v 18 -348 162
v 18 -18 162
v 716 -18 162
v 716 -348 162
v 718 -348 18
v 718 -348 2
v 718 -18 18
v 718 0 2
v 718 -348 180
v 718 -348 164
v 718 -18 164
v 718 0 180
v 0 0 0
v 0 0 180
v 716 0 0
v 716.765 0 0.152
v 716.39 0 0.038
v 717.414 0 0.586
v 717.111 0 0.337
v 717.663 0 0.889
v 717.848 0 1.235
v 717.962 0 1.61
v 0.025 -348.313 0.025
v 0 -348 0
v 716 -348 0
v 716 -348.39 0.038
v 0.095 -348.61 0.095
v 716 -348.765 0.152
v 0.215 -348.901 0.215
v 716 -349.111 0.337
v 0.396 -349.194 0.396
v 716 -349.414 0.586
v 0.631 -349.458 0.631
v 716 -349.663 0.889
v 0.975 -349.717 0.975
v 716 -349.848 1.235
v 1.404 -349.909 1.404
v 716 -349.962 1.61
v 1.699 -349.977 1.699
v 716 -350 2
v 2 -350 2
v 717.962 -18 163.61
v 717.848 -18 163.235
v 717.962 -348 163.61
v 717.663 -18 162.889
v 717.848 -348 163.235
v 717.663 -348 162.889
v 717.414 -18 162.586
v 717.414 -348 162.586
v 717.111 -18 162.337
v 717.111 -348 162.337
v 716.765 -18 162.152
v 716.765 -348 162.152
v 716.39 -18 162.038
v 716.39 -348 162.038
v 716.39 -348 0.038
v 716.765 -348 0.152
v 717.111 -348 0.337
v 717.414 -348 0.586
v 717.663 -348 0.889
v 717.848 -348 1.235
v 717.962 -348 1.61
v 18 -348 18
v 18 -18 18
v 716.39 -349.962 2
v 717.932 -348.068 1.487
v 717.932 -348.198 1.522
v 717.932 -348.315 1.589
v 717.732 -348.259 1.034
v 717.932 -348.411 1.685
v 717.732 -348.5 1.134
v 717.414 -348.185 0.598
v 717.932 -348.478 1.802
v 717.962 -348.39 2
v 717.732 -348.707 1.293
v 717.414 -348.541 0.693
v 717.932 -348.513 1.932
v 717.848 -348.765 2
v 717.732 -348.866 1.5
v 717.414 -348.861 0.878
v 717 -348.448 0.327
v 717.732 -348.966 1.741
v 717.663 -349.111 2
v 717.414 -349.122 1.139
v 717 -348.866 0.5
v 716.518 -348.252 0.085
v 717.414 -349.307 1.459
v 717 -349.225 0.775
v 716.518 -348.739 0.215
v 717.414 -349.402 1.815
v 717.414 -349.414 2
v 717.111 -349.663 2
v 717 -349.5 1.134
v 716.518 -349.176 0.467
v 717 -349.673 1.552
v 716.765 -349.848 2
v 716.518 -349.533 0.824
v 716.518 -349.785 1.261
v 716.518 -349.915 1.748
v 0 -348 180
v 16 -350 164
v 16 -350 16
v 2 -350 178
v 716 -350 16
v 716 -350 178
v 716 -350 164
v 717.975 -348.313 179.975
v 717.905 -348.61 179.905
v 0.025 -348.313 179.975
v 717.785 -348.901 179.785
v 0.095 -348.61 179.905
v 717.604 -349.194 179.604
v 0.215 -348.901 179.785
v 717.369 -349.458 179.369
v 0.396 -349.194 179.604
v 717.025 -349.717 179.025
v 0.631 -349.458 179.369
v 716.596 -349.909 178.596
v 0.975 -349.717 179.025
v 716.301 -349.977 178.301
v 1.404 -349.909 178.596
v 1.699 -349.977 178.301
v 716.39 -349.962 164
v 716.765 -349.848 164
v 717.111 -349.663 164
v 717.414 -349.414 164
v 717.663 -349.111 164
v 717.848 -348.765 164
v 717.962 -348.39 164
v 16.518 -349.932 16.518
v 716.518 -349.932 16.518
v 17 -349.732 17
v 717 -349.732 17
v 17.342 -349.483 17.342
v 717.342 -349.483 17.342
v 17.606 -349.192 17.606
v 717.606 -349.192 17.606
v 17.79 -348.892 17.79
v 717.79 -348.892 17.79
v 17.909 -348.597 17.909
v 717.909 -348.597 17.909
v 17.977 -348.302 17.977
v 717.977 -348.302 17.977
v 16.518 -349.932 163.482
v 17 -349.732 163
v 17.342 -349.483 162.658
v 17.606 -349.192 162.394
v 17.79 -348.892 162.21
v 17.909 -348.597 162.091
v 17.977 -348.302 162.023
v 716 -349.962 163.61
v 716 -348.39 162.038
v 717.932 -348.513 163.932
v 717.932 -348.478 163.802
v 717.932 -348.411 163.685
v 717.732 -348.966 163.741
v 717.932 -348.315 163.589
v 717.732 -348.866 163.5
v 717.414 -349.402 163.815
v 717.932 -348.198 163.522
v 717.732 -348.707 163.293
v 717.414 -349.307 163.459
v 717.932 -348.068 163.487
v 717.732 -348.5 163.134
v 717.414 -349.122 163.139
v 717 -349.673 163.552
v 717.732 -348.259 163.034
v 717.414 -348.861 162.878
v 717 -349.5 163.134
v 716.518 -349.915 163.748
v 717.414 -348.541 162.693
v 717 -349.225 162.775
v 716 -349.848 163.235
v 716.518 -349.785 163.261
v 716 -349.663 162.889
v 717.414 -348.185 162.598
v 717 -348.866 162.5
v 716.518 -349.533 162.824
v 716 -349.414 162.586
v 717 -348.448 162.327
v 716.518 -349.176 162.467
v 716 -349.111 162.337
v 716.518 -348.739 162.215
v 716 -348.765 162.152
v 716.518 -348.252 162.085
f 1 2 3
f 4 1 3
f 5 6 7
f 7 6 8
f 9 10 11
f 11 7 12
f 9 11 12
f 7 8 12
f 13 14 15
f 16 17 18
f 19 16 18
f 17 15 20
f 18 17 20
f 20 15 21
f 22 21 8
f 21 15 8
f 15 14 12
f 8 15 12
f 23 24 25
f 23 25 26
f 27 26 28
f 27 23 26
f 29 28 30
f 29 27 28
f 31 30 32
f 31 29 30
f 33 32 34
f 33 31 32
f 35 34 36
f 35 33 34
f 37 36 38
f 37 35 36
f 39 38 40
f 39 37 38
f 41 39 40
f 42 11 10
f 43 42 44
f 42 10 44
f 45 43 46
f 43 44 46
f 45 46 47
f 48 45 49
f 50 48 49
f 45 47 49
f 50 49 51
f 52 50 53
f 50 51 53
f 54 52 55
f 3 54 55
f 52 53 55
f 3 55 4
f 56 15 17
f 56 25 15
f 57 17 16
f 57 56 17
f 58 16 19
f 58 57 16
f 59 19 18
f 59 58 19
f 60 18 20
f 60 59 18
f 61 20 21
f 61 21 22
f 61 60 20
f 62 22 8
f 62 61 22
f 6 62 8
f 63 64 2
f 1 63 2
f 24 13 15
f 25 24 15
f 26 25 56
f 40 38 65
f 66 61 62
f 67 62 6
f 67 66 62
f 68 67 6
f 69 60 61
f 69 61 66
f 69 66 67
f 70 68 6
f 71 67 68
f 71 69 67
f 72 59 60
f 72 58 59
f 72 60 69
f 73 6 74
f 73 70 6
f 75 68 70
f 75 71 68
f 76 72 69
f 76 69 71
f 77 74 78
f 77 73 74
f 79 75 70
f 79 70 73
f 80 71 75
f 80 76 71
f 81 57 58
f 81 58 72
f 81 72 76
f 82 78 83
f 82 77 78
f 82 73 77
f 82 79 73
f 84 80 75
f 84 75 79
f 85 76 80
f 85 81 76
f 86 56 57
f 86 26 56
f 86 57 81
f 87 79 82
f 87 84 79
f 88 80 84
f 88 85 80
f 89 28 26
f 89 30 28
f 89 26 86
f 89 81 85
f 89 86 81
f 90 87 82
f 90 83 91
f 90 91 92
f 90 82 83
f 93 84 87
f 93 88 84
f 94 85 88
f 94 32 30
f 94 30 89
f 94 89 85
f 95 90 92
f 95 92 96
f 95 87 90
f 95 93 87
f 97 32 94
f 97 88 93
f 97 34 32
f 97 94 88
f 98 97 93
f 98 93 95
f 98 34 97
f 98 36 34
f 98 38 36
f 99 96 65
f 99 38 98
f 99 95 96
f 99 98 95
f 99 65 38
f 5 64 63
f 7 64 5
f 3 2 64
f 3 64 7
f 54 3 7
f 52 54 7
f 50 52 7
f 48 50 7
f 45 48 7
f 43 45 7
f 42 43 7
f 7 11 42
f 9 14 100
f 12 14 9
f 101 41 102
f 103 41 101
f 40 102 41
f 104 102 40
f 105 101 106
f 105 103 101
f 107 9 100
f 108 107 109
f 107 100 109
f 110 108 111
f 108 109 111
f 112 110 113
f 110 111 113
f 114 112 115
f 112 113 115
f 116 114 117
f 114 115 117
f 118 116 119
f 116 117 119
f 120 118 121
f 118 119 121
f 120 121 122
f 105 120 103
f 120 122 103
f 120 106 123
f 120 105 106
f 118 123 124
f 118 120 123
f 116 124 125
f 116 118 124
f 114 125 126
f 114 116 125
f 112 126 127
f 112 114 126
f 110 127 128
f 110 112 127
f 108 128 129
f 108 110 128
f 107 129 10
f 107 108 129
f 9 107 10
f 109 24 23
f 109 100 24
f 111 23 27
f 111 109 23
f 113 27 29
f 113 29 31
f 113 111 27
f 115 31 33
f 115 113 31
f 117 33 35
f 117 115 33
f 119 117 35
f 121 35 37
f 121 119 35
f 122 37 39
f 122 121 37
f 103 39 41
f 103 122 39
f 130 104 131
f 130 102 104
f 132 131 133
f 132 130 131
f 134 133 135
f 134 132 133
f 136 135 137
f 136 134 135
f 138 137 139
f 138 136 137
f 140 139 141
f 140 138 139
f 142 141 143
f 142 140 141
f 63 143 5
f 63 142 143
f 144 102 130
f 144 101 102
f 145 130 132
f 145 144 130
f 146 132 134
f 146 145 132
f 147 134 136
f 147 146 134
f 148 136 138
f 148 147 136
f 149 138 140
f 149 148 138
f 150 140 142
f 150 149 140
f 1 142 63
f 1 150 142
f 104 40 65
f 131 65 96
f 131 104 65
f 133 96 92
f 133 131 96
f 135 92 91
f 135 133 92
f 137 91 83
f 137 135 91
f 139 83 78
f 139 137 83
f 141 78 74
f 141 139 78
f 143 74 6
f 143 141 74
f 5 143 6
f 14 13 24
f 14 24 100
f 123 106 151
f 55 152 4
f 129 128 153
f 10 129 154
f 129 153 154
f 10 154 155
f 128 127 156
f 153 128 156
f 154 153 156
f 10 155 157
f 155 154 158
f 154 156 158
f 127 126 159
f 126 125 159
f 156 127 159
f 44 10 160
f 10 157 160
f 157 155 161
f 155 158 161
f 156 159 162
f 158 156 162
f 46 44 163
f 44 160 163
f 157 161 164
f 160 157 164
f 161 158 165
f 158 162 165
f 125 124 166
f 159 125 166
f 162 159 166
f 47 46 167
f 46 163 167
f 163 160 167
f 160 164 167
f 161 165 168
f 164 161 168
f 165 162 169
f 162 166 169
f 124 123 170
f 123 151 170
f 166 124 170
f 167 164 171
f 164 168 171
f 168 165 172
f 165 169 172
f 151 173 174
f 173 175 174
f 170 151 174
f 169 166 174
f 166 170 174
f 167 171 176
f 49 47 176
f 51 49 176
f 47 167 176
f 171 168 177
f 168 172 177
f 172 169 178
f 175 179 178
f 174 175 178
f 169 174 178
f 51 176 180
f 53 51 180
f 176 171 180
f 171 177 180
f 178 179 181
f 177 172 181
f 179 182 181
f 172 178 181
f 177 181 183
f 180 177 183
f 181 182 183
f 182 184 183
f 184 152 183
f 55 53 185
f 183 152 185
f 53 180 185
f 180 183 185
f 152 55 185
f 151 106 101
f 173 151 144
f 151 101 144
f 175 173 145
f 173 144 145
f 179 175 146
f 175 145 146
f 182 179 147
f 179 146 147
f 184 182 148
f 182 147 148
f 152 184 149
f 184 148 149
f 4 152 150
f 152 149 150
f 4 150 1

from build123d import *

# Parameters (mm, degrees)
F0_W     = 51.6054928303
F0_H     = 42.5849854946
F1_DEPTH = 350
F2_DEPTH = 718
F3_DEPTH = 180
F4_T     = -18
F5_R     = 2


# Not quite as in the source:
# - two fillets or chamfers of one size are made in one step


with BuildPart() as f1:
    # F0 (on Front) → F1 (new body)
    with BuildSketch(Plane.XZ):
        with Locations((25.8027464151, 21.2924927473)):
            Rectangle(F0_W, F0_H)
    extrude(amount=F1_DEPTH)

    # F2 (add): a face of the model
    f2_faces = [f1.faces().sort_by_distance(p)[0] for p in [
        (0, -175, 21.2924927473),
    ]]
    extrude(f2_faces, amount=-F2_DEPTH)

    # F3 (add): a face of the model
    f3_faces = [f1.faces().sort_by_distance(p)[0] for p in [
        (359, -175, 0),
    ]]
    extrude(f3_faces, amount=-F3_DEPTH)

    # F4
    f4_openings = [f1.faces().sort_by_distance(p)[0] for p in [
        (359, -350, 90),
        (718, -175, 90),
    ]]
    offset(amount=F4_T, openings=f4_openings)

    # F5
    f5_edges = [f1.edges().sort_by_distance(p)[0] for p in [
        (359, -350, 180),
        (0, -350, 90),
        (359, -350, 0),
        (718, -175, 0),
        (718, -350, 9),
        (368, -350, 18),
        (18, -350, 90),
        (368, -350, 162),
        (718, -350, 171),
        (718, -184, 162),
    ]]
    fillet(f5_edges, radius=F5_R)


solid = f1.part
